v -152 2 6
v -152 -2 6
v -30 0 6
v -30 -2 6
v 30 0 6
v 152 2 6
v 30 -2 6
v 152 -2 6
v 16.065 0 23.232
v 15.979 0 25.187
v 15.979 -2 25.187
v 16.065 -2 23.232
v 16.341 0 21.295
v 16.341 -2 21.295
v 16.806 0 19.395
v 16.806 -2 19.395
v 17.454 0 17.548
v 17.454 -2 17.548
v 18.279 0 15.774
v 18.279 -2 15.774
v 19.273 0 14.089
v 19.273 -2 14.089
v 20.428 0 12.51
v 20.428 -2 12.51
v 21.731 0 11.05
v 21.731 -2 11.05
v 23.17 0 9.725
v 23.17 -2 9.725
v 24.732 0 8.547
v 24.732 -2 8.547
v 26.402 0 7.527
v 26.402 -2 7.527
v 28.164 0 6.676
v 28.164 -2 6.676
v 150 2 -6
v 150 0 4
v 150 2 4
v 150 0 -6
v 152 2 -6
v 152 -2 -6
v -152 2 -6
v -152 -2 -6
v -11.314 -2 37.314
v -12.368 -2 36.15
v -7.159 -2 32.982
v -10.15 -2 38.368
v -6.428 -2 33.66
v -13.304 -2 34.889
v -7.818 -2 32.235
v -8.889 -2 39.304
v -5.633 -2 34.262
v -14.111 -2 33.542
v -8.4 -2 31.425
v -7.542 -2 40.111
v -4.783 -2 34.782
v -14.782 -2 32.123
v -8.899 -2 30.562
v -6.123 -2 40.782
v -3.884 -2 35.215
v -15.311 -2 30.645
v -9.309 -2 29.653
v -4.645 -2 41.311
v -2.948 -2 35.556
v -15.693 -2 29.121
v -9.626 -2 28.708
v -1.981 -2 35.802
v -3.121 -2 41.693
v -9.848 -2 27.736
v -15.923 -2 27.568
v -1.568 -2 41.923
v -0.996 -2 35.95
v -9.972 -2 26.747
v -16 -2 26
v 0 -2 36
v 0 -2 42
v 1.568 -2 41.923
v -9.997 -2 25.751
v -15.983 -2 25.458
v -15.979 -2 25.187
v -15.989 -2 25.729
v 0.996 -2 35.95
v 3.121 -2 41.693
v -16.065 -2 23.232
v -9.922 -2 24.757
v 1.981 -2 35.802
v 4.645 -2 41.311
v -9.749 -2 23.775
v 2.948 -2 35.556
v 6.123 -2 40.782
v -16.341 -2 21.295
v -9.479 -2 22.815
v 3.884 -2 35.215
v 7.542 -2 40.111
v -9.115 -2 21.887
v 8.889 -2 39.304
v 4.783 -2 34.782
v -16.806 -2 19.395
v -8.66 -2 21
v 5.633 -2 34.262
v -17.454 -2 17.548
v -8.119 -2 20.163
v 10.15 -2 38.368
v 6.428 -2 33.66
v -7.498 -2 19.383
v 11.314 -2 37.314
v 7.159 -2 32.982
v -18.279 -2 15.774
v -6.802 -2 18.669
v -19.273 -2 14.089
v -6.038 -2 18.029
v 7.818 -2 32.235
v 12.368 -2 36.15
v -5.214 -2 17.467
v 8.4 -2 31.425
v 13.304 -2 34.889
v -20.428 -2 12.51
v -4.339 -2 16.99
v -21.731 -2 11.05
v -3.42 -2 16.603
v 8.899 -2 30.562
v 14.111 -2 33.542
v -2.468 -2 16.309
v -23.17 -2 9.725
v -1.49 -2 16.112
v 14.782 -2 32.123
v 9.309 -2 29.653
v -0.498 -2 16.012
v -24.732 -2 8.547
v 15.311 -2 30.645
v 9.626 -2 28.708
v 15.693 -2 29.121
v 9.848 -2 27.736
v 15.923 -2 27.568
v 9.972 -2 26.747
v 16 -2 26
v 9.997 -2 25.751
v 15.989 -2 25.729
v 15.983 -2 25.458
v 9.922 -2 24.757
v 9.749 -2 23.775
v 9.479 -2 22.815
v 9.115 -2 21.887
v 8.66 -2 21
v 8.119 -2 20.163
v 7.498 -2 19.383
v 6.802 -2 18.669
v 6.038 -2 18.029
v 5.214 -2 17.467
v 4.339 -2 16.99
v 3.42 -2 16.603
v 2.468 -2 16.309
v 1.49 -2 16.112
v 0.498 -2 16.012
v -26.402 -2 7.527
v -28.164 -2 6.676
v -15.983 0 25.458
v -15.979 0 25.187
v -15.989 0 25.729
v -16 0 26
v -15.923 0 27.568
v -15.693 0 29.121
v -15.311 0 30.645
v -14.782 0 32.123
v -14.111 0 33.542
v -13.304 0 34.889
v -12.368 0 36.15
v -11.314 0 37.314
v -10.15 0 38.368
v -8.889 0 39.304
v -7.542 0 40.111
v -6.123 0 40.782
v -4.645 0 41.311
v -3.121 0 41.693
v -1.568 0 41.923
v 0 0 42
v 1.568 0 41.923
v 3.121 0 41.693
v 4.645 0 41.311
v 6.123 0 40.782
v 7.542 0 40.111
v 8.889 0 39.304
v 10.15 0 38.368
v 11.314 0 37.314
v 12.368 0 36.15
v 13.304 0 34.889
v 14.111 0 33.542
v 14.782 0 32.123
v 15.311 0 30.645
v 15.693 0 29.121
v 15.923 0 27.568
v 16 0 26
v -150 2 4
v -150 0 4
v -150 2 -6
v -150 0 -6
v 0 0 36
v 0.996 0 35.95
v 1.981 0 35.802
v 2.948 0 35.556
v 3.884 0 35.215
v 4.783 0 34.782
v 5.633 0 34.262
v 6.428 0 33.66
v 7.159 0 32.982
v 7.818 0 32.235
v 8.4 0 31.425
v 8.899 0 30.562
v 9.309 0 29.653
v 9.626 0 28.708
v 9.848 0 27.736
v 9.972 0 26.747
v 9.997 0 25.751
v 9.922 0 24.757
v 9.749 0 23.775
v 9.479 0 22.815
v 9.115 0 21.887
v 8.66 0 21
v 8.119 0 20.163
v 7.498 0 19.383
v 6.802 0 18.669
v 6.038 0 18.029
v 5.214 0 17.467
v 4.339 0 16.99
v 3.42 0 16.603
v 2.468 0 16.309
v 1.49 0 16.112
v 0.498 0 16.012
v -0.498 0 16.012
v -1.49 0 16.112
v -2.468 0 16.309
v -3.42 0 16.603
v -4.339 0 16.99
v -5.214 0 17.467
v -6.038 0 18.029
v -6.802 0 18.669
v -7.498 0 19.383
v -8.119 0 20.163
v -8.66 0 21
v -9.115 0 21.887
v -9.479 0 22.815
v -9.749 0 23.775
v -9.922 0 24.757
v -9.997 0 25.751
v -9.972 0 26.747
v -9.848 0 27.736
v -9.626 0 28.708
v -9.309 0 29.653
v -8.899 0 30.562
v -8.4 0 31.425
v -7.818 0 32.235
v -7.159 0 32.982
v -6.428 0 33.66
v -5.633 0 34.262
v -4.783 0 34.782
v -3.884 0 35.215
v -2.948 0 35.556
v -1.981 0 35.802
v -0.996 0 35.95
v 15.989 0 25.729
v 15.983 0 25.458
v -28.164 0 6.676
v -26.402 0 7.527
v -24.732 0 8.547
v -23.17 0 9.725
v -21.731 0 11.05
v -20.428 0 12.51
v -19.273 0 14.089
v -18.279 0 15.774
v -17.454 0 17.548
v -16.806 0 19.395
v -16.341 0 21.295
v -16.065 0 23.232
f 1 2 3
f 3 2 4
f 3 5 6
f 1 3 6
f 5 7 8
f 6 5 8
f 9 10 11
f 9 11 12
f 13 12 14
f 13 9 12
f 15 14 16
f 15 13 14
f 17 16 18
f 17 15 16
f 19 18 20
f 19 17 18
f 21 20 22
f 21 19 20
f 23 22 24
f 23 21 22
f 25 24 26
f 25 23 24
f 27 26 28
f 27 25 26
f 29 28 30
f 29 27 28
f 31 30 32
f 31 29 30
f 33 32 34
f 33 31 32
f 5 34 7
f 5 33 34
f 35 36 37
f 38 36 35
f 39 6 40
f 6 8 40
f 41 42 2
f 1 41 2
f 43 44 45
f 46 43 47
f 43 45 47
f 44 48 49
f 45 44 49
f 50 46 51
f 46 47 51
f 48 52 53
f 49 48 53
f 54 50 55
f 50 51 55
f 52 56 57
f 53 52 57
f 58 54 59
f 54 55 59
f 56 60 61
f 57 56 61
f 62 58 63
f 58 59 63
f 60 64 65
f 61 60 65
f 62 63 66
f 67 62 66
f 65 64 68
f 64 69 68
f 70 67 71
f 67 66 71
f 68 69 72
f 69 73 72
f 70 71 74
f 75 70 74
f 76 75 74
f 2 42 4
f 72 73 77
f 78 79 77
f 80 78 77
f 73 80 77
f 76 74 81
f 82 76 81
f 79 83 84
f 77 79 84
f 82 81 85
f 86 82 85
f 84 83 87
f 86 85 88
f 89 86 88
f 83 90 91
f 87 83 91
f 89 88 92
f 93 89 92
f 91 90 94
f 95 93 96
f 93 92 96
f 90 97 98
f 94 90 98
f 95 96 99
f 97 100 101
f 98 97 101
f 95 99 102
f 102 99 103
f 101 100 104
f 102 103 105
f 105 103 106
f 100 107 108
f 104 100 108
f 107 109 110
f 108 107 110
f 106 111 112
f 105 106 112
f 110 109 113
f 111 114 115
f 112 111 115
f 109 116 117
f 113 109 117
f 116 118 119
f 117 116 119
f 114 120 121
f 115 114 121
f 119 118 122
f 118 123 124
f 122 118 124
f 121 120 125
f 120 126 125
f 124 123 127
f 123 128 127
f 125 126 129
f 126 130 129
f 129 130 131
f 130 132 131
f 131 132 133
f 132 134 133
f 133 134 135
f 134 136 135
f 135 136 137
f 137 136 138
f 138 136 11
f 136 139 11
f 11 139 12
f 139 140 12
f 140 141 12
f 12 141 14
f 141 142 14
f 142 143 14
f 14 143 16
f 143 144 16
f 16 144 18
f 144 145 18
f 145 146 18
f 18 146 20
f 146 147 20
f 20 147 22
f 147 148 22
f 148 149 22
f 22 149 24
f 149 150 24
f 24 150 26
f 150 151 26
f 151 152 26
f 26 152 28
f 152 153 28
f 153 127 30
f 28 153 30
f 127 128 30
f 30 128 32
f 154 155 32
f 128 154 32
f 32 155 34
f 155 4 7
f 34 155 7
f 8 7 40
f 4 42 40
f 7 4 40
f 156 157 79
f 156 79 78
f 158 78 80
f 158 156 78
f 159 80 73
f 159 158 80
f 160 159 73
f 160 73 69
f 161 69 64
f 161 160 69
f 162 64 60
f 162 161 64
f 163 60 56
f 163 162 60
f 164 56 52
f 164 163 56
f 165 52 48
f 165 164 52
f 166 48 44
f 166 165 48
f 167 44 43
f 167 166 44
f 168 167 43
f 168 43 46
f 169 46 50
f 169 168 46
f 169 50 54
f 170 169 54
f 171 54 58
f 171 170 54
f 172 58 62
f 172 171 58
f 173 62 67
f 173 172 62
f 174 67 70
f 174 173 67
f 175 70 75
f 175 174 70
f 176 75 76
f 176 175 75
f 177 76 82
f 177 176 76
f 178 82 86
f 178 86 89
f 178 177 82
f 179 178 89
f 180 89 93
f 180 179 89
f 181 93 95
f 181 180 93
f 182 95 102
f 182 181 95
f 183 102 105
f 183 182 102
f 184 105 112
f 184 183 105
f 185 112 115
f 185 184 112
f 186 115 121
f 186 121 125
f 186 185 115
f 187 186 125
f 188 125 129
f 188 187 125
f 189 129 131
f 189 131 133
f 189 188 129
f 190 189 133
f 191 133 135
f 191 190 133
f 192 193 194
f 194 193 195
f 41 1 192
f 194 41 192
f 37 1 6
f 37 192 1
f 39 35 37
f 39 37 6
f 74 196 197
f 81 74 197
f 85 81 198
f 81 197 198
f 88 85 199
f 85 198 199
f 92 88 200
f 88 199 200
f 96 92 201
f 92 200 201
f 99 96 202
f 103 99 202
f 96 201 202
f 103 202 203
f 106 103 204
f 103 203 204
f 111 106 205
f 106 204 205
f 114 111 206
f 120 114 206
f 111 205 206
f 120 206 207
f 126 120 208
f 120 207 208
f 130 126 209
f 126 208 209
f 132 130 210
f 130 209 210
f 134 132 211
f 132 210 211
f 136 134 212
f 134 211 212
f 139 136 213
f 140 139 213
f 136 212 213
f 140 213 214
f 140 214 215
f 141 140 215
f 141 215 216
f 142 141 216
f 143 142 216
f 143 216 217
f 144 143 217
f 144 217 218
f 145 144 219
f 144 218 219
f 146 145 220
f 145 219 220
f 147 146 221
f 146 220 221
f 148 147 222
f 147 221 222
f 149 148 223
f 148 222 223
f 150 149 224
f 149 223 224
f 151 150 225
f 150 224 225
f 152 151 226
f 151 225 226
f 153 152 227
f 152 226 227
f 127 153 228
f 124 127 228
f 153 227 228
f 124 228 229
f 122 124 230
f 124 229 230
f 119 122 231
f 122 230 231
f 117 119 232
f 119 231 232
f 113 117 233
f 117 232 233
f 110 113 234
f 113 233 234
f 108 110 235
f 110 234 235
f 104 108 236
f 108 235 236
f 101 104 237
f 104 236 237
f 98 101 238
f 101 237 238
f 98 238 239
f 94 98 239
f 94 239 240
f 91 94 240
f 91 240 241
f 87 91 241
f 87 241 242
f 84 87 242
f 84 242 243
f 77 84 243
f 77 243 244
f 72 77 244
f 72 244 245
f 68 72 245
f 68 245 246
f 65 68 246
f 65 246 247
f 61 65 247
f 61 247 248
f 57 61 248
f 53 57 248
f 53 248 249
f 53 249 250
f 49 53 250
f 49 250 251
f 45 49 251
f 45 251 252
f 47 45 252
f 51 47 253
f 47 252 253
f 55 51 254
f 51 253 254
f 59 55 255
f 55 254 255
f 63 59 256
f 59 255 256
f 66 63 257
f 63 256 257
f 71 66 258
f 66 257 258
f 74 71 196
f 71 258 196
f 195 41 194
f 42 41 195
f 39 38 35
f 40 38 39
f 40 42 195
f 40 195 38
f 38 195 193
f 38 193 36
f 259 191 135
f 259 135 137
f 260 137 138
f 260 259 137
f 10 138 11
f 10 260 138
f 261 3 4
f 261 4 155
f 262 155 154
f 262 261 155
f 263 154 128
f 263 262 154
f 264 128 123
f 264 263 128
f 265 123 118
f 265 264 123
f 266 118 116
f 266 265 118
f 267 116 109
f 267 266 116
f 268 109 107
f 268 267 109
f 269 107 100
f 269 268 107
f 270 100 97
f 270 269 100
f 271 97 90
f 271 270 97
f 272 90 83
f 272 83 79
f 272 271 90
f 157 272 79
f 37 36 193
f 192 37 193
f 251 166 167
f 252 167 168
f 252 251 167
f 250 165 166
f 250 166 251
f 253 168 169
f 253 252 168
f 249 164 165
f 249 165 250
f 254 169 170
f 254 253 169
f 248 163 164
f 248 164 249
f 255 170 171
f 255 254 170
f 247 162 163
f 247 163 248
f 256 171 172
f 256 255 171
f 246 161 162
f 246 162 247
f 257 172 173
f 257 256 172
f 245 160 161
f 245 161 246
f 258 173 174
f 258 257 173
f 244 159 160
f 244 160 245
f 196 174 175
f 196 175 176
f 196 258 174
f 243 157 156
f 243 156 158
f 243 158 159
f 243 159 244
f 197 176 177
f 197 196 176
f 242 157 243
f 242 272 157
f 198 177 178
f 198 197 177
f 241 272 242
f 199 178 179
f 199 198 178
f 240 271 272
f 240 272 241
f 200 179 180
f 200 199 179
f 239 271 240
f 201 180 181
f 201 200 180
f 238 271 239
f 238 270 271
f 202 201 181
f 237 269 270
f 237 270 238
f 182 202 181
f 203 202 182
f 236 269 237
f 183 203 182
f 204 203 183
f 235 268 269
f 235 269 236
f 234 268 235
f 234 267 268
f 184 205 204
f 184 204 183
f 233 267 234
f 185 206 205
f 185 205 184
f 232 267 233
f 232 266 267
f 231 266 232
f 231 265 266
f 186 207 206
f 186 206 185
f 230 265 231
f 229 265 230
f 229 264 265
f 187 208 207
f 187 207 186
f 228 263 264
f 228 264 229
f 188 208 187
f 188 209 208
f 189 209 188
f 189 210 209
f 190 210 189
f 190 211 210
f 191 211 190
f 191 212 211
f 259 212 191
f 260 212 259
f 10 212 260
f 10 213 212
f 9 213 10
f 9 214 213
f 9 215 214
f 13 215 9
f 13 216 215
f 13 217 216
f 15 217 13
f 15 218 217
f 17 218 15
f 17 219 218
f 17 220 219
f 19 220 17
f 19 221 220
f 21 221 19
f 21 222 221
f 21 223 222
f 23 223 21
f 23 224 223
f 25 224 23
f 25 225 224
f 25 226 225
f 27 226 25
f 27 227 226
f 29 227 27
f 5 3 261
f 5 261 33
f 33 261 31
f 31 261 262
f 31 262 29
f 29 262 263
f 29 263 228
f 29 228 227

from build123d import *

# Parameters (mm, degrees)
SKETCH2_W           = 304
SKETCH2_H           = 12
SKETCH2_R           = 10
BOSS_EXTRUDE2_DEPTH = 2
SKETCH4_W           = 2
SKETCH4_H           = 10
SKETCH4_H_2         = 2
BOSS_EXTRUDE4_DEPTH = 2


with BuildPart() as part:
    # Sketch2 → Boss-Extrude2 (new body)
    # profile 1 of 3: a face of its own
    with BuildSketch(Plane(origin=(0, 0, 0), x_dir=(1, 0, 0), z_dir=(0, 1, 0))):
        Rectangle(SKETCH2_W, SKETCH2_H)
    # profile 2 of 3: a face of its own
    with BuildSketch(Plane(origin=(0, 0, 0), x_dir=(1, 0, 0), z_dir=(0, 1, 0))):
        with BuildLine():
            Line((30, -6), (-30, -6))
            ThreePointArc((-30, -6), (-19.831001195, -13.285363729), (-15.97933301, -25.187032248))
            ThreePointArc((-15.97933301, -25.187032248), (0, -10), (15.97933301, -25.187032248))
            ThreePointArc((15.97933301, -25.187032248), (19.831001195, -13.285363729), (30, -6))
        make_face()
    # profile 3 of 3: a face of its own
    with BuildSketch(Plane(origin=(0, 0, 0), x_dir=(1, 0, 0), z_dir=(0, 1, 0))):
        with BuildLine():
            ThreePointArc((15.97933301, -25.187032248), (0, -10), (-15.97933301, -25.187032248))
            ThreePointArc((-15.97933301, -25.187032248), (-15.985534015, -25.593621179), (-16, -26))
            ThreePointArc((-16, -26), (0, -42), (16, -26))
            ThreePointArc((16, -26), (15.985534015, -25.593621179), (15.97933301, -25.187032248))
        make_face()
        with Locations(Location((0, -26, 0), (0, 0, 270))):
            Circle(SKETCH2_R, mode=Mode.SUBTRACT)
    extrude(amount=-BOSS_EXTRUDE2_DEPTH)

    # Sketch4 → Boss-Extrude4 (add)
    with BuildSketch(Plane(origin=(0, 0, 0), x_dir=(1, 0, 0), z_dir=(0, 1, 0))):
        with Locations((-151, 1)):
            Rectangle(SKETCH4_W, SKETCH4_H)
        with Locations((-151, -5)):
            Rectangle(SKETCH4_W, SKETCH4_H_2)
        Polygon((0, -4), (-150, -4), (-150, -6), (-30, -6), (0, -6), align=None)
        Polygon((150, -4), (0, -4), (0, -6), (30, -6), (150, -6), align=None)
        with Locations((151, -5)):
            Rectangle(SKETCH4_W, SKETCH4_H_2)
        with Locations((151, 1)):
            Rectangle(SKETCH4_W, SKETCH4_H)
    extrude(amount=BOSS_EXTRUDE4_DEPTH)


solid = part.part
